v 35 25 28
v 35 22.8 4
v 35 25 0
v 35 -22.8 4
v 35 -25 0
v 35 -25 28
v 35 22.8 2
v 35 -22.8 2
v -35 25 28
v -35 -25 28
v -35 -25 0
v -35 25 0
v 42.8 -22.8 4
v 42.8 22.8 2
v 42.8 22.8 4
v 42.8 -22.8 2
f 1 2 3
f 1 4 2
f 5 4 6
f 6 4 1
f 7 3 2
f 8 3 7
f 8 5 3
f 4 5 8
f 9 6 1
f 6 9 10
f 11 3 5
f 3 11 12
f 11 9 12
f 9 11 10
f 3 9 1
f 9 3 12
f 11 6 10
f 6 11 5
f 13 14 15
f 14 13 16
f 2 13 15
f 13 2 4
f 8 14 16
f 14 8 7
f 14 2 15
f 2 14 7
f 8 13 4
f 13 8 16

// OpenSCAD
// Two-part enclosure for a small electronics board (e.g. Arduino-based temperature logger)
// Print orientation: both parts rest on the bed (z = 0), side by side, 10 mm apart in X.
// The box is open-topped; the lid is a plate with a lip that slides into the box opening.
// Units: mm

// ---------------- Parameters ----------------
box_x      = 70;    // box outer length (X)
box_y      = 50;    // box outer width (Y)
box_h      = 30;    // box outer height (Z)
wall       = 2;     // box wall thickness
floor      = 2;     // box floor thickness
lip_t      = 1.5;   // lid lip thickness
lip_h      = 4;     // lid lip height (extends above the plate)
lip_x      = 65.6;  // lip outer length (X)
lip_y      = 45.6;  // lip outer width (Y)
clearance  = 0.2;   // clearance between lip outer size and box opening, per side
gap        = 10;    // gap between box and lid on the bed
eps        = 0.5;   // cutter overshoot past faces

$fn = 64;

// Derived: box opening size (inner X/Y), must match lip size minus clearance
opening_x = lip_x - 2 * clearance;  // 65.2
opening_y = lip_y - 2 * clearance;  // 45.2

// ---------------- Model ----------------
difference() {
    union() {
        // Part 1: box (open top)
        translate([-box_x / 2, -box_y / 2, 0])
            cube([box_x, box_y, box_h - floor]);   // floor included in height

        // Part 2: lid (plate with a centred lip on its +Z side)
        translate([-box_x / 2 + gap, -box_y / 2, 0])
            cube([box_x / 2 - gap, box_y, lip_h + floor]);   // plate under the lip

        // The lip is a block that sits on top of the plate and overhangs it on X and Y.
        // It is centred on the plate. Its top and side faces are cut back by eps so no
        // faces are exactly coplanar with the plate or the box opening.
        translate([-box_x / 2 + gap + (box_x - lip_x) / 2,
                   -box_y / 2 + (box_y - lip_y) / 2,
                   floor])
            cube([lip_x, lip_y, lip_t + eps]);
    }

    // Cut the box opening from the top face of the box (through the walls and floor)
    translate([-box_x / 2, -box_y / 2, box_h - eps])
        cube([opening_x, opening_y, 2 * eps]);
}
